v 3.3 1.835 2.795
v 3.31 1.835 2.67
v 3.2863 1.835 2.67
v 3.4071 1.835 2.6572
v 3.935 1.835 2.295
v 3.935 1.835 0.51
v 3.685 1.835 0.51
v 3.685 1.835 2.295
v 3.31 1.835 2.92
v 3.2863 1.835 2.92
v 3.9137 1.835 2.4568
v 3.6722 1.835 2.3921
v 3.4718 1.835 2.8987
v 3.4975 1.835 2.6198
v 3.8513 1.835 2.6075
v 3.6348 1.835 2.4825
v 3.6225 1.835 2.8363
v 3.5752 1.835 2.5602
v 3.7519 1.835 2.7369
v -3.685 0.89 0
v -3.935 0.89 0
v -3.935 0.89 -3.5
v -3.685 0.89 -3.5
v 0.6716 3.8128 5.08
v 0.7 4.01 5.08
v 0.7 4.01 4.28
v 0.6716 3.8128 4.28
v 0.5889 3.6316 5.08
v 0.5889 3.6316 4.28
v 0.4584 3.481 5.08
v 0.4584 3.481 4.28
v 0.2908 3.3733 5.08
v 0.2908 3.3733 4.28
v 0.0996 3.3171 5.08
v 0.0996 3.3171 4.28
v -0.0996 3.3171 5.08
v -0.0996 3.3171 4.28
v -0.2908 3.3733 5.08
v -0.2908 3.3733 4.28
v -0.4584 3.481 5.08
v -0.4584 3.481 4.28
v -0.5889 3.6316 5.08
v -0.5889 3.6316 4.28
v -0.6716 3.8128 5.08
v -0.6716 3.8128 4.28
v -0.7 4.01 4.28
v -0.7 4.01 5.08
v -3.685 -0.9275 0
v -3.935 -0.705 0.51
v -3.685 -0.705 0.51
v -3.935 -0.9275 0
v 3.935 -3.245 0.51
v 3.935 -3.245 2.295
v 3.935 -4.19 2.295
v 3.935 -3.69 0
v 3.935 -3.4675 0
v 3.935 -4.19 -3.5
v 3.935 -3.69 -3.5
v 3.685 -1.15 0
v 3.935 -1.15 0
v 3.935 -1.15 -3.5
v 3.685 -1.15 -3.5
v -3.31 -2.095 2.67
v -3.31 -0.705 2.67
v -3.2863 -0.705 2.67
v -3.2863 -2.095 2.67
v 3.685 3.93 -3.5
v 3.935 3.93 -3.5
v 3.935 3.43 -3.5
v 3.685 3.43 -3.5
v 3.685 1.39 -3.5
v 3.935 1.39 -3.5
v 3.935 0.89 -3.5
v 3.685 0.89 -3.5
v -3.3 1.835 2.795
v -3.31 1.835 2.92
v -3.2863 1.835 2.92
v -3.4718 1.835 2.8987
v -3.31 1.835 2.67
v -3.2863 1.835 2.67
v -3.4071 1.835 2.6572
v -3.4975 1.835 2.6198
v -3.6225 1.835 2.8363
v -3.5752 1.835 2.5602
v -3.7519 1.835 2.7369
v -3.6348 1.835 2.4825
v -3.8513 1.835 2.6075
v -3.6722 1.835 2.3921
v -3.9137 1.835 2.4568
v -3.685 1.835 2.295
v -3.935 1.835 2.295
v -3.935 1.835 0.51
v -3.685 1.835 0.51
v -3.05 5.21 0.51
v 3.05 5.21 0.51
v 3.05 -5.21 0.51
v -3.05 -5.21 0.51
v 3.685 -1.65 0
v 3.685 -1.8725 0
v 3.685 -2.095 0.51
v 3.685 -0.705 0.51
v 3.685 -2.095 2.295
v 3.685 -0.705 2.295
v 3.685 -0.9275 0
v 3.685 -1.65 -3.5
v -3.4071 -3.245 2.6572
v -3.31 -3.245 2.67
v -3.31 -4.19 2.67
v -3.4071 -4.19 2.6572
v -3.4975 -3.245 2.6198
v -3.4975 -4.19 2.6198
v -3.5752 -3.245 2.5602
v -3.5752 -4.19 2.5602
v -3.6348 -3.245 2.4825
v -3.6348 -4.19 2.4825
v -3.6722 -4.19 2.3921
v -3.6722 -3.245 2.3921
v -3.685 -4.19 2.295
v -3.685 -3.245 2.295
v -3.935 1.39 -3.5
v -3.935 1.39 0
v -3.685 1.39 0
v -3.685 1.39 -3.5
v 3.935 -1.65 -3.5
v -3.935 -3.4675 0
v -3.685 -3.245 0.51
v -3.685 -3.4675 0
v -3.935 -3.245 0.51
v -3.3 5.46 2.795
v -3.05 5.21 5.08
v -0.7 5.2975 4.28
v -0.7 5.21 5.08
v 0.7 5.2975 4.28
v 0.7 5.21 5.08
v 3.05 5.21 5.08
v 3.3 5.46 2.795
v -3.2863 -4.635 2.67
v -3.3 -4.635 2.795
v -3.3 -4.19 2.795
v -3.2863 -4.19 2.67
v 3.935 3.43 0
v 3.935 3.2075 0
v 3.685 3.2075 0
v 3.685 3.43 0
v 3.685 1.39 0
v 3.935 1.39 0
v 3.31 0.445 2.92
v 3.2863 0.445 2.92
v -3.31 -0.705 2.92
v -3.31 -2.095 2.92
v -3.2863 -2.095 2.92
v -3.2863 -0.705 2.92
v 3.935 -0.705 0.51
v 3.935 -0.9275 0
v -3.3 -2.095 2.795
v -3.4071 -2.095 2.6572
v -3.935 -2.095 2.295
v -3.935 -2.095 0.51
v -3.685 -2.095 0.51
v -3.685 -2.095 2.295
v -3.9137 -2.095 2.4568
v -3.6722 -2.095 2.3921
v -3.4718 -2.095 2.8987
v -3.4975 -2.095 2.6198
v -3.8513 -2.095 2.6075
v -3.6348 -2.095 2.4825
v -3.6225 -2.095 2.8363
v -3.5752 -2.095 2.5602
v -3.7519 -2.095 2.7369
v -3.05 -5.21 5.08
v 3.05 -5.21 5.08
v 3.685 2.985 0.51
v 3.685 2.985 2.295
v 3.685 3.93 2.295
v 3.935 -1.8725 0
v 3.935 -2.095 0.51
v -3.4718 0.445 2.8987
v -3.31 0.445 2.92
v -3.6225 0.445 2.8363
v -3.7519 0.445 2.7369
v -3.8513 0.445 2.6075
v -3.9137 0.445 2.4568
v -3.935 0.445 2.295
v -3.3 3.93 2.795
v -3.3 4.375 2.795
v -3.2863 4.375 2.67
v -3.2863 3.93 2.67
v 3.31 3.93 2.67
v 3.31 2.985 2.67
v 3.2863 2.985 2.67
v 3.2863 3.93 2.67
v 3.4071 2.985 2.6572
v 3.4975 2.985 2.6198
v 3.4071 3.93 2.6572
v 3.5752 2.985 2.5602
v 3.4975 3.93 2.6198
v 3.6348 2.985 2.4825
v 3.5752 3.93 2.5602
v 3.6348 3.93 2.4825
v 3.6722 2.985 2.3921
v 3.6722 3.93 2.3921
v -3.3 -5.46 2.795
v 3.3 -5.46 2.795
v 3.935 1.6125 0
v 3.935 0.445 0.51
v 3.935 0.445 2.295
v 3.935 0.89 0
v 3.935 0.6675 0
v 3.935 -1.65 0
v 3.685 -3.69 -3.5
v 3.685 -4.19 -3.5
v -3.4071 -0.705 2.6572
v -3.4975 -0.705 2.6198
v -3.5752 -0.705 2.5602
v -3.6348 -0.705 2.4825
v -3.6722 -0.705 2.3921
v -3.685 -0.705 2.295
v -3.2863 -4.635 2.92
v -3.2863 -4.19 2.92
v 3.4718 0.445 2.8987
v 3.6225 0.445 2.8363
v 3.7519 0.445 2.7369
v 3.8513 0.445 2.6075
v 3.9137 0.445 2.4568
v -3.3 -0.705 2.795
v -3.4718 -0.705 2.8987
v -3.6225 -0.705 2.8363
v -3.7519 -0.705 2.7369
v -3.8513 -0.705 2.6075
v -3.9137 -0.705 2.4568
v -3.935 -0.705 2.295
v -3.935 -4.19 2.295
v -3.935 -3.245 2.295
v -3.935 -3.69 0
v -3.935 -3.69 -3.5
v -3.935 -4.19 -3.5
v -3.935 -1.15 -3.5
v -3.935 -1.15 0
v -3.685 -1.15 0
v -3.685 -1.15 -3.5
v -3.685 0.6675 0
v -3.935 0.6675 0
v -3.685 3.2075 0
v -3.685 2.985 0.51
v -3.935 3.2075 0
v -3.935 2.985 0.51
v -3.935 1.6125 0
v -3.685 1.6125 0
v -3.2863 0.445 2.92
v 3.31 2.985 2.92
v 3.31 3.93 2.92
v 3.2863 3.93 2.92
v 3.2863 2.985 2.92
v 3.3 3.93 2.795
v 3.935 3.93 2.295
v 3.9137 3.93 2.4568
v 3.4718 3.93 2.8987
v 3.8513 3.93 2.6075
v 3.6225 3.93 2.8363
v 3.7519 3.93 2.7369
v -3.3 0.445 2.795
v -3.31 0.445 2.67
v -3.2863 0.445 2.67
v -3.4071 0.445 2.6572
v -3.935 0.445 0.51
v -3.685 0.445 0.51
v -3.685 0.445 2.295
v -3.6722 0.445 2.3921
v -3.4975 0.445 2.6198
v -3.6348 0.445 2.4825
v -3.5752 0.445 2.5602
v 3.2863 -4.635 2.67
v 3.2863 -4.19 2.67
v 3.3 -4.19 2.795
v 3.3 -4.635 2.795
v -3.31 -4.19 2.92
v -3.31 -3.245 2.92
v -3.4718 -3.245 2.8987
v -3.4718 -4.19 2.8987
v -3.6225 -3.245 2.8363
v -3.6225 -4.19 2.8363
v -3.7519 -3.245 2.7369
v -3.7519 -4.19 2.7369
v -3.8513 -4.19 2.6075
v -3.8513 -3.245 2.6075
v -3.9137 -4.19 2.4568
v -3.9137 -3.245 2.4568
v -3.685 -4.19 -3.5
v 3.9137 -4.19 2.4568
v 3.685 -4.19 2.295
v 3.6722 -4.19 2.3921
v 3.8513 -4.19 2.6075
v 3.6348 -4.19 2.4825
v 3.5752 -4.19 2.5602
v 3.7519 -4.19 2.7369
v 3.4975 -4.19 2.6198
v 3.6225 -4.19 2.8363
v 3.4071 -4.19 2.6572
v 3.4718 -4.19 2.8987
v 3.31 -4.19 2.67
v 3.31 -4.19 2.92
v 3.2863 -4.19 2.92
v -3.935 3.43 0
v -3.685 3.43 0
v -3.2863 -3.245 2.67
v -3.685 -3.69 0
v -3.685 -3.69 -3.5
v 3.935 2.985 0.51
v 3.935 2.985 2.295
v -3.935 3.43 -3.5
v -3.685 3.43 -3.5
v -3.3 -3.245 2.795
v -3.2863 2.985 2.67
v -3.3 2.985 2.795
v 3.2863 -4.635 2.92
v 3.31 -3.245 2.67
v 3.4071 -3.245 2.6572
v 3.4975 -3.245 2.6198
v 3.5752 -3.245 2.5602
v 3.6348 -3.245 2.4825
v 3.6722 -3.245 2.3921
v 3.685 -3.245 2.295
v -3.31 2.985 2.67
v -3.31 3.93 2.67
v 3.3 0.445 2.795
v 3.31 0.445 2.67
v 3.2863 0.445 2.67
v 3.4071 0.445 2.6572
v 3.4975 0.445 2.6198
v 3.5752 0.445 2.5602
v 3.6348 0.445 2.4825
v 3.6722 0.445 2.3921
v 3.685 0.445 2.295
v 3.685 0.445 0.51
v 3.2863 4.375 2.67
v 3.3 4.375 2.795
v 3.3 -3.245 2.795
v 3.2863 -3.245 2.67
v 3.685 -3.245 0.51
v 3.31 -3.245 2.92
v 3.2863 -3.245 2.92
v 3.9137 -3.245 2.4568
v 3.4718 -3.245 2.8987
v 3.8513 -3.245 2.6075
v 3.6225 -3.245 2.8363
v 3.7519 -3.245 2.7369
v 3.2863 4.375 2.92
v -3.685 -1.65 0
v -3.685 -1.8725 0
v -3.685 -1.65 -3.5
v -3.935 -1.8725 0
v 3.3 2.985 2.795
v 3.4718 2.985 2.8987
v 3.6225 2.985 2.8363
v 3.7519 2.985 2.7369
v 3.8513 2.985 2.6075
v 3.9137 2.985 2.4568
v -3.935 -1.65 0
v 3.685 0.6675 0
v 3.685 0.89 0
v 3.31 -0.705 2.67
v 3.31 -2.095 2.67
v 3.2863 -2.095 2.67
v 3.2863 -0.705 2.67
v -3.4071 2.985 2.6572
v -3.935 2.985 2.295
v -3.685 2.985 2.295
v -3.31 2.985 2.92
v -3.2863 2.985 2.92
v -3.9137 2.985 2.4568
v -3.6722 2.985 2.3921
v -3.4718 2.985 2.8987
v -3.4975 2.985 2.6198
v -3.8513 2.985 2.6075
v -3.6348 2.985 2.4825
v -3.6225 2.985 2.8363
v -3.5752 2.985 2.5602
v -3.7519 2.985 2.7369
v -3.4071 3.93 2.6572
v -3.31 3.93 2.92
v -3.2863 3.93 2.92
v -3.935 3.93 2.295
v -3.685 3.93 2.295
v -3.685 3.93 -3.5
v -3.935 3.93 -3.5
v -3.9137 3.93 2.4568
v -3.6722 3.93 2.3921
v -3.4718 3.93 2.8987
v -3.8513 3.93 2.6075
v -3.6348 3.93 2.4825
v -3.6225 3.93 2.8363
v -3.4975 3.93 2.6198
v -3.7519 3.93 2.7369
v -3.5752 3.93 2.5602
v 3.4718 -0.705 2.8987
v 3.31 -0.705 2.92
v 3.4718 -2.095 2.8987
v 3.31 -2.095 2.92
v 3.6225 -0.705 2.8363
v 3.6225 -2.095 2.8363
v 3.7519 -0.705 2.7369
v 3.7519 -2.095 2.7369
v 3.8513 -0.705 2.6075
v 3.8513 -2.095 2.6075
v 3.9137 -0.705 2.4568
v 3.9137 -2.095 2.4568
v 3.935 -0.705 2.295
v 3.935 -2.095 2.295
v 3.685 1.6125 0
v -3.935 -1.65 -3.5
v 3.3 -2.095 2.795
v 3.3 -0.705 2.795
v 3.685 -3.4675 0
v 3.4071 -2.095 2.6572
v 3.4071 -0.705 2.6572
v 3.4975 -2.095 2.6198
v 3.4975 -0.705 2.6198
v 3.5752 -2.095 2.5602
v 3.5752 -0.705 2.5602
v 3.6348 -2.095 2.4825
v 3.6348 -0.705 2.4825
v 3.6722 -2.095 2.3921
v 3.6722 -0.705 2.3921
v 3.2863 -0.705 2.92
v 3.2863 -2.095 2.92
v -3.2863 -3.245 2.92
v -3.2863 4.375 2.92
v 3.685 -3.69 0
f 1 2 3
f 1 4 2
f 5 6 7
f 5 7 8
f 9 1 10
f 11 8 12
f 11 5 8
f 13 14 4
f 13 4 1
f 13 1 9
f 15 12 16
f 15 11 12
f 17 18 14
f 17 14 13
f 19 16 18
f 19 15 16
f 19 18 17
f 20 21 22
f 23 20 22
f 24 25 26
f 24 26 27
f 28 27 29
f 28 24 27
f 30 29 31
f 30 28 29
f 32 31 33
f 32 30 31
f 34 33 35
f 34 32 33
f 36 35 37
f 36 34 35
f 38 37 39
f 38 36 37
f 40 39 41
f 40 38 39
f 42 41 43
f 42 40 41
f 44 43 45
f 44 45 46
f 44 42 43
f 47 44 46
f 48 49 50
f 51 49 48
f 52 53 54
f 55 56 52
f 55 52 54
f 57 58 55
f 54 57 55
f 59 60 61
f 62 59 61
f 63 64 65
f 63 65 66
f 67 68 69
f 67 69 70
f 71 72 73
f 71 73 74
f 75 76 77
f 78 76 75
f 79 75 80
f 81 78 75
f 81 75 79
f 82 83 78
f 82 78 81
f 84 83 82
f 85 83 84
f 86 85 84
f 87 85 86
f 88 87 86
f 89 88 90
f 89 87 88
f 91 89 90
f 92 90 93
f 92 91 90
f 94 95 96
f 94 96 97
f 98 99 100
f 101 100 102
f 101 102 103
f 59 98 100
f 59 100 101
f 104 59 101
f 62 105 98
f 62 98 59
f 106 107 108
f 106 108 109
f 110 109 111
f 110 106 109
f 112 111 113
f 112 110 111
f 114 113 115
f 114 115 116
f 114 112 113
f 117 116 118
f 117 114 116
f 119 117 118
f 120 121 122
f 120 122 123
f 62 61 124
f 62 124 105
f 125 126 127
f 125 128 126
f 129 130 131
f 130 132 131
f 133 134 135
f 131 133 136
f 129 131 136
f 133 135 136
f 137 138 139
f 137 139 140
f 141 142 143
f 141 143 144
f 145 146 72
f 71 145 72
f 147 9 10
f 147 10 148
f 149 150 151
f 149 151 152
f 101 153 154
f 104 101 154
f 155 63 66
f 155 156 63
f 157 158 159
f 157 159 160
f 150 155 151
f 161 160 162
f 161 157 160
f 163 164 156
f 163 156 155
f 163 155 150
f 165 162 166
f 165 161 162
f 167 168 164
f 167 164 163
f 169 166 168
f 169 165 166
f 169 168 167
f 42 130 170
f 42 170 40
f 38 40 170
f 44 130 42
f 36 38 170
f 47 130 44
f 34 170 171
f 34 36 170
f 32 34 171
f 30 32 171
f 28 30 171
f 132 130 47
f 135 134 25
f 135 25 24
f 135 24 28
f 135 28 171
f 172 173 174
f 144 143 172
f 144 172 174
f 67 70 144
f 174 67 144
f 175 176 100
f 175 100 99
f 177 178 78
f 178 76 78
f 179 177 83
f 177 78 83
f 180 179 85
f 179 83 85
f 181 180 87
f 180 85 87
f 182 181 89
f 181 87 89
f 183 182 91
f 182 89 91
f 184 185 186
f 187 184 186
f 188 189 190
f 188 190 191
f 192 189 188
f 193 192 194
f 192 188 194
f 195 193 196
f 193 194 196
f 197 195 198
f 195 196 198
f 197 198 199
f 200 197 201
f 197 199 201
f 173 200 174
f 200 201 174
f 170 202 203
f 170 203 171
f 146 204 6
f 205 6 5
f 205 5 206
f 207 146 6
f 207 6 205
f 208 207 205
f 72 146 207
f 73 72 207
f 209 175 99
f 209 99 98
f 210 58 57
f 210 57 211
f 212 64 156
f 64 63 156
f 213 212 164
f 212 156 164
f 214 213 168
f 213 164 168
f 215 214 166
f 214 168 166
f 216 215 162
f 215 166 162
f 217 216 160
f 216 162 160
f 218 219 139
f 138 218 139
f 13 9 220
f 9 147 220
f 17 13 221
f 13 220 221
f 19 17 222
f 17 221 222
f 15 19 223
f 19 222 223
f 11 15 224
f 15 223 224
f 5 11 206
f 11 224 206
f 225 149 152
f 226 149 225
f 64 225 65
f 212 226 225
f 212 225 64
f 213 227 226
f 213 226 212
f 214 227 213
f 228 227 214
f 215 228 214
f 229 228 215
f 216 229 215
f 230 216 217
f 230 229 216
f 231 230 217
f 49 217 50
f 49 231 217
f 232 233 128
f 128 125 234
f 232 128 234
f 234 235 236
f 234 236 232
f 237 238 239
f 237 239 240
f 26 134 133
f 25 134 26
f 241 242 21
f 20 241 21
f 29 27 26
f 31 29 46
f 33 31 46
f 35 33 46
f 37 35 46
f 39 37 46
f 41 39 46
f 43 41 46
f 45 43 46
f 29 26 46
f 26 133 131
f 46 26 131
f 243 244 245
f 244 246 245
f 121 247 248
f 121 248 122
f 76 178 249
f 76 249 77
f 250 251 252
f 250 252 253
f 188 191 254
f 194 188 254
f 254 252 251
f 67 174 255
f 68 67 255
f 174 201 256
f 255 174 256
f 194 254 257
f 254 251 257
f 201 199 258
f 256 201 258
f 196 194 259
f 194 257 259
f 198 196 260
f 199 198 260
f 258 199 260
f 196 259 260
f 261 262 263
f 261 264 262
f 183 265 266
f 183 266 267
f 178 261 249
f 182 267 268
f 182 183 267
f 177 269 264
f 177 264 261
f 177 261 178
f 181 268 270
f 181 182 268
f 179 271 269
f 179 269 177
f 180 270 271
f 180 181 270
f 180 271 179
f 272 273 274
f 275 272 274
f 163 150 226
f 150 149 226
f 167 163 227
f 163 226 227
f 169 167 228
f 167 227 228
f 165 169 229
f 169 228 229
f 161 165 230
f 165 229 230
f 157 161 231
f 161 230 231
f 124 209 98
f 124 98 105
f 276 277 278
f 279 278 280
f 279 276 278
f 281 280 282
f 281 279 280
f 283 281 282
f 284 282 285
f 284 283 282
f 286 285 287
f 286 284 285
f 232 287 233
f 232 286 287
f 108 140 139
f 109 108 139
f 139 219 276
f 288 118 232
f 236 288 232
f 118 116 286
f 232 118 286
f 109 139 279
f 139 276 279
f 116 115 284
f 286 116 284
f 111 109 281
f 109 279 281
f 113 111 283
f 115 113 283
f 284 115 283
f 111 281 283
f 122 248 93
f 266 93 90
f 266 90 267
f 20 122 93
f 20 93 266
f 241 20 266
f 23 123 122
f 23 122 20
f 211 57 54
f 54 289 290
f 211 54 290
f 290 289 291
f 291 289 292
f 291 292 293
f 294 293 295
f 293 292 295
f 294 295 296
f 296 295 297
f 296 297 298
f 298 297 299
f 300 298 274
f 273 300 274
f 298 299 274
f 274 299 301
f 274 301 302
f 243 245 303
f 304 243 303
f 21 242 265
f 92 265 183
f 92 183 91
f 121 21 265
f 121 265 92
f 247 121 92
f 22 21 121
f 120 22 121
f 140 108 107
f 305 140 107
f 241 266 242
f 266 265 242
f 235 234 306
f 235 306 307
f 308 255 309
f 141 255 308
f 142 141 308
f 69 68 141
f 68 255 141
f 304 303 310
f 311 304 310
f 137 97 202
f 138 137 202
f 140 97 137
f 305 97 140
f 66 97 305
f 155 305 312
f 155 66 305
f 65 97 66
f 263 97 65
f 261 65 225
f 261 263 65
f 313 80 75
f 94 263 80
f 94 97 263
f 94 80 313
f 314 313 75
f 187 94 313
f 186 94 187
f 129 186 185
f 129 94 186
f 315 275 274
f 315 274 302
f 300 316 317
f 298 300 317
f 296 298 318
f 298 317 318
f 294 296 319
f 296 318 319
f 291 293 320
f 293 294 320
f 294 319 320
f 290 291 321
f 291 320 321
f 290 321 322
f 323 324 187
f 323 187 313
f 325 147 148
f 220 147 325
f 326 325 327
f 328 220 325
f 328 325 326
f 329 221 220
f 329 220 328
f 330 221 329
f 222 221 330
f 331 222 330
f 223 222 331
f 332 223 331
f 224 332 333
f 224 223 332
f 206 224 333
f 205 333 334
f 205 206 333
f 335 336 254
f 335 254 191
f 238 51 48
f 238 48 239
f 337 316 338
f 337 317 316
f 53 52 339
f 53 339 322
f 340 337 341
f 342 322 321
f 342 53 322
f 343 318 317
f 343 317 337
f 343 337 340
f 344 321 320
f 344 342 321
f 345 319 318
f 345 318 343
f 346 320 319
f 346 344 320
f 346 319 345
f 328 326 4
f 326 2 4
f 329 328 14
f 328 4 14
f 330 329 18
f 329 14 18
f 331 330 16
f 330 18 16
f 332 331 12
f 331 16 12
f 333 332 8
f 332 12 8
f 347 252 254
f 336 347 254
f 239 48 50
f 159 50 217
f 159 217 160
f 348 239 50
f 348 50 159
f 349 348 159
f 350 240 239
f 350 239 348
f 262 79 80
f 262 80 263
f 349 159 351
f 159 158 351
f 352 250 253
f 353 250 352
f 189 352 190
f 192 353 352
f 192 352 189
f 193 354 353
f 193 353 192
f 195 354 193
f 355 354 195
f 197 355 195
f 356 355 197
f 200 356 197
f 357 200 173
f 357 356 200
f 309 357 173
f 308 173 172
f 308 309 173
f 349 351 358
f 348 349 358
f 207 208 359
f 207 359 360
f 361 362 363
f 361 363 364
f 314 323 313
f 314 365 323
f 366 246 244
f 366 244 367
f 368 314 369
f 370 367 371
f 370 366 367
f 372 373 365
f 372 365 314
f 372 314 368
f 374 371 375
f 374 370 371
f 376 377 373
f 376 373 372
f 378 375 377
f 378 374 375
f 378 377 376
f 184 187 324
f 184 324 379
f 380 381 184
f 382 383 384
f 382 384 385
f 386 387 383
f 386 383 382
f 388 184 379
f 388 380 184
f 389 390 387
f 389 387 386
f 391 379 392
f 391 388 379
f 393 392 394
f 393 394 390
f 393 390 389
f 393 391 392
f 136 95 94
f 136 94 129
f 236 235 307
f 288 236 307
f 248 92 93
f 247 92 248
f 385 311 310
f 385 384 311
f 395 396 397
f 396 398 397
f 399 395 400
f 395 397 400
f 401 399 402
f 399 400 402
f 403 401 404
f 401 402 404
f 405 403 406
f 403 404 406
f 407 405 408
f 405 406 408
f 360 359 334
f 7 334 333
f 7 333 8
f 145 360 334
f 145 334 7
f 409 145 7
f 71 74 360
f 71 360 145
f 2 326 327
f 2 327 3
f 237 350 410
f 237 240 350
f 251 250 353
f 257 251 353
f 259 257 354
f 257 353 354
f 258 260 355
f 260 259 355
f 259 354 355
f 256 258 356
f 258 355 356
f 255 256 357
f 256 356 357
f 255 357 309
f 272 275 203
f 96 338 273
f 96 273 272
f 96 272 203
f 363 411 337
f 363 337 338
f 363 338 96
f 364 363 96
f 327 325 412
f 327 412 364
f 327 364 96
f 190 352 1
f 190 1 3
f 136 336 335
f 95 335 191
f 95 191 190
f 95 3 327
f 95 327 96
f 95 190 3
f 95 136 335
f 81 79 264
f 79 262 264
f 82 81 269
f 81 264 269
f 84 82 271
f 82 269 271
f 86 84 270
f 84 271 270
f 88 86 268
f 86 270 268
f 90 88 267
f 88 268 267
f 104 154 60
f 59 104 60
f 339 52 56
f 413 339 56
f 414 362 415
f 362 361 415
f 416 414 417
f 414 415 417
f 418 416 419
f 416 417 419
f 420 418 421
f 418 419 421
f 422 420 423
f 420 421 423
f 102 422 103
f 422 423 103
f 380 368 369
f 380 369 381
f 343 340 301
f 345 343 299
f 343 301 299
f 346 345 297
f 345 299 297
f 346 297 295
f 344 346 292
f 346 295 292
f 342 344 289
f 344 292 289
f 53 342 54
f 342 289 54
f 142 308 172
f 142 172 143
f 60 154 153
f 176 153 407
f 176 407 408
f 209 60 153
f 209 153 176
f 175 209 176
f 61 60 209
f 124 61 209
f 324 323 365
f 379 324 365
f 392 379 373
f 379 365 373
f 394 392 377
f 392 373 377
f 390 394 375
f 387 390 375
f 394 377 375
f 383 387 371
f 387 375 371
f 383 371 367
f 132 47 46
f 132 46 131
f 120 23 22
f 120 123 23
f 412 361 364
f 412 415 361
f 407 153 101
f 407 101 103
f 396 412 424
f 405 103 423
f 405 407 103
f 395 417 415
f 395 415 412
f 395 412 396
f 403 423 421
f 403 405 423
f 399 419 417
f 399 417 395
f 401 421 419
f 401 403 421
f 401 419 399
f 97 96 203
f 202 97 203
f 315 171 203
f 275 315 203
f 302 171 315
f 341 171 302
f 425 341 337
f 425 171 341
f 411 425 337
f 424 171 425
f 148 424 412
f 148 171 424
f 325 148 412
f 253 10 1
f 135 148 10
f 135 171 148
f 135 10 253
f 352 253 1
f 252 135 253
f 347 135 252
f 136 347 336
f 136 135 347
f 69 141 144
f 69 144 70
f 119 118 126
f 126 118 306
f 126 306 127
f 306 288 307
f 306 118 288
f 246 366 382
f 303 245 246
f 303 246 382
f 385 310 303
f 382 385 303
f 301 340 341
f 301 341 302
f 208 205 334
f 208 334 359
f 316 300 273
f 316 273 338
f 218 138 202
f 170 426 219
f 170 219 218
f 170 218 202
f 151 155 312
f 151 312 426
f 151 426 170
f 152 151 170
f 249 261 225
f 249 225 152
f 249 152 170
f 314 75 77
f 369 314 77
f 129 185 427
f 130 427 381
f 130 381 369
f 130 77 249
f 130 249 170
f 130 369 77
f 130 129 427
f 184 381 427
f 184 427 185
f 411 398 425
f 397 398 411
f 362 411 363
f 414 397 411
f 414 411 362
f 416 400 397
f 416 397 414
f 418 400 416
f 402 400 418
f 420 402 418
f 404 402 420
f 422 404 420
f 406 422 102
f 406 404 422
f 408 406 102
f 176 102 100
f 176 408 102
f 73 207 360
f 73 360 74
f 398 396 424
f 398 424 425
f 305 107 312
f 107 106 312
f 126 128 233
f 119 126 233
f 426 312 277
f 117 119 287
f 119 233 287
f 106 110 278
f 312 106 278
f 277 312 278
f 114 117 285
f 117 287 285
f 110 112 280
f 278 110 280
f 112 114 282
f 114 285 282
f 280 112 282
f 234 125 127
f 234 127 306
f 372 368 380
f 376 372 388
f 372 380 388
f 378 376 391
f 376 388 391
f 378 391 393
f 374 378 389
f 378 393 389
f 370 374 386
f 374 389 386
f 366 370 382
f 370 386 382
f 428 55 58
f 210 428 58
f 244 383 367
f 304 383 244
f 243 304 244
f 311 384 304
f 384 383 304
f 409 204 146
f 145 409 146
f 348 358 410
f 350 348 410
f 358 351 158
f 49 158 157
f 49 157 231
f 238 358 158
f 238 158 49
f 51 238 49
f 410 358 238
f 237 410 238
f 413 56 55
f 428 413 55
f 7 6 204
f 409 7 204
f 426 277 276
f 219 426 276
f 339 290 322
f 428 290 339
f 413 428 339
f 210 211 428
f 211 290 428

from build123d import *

# Parameters (mm, degrees)
BASIC_SHAPE_DEPTH              = 5.46
SIDE_PROFILE1_DEPTH            = 4.3
SIDE_PROFILE1_DEPTH_BACK       = 4.3
SIDE_PROFILE2_DEPTH            = 4.3
SIDE_PROFILE2_DEPTH_BACK       = 4.3
LOCATION_MARK_DEPTH            = 0.8
SKETCH6_W                      = 0.25
SKETCH6_H                      = 1.39
PIN_RELIEF_DEPTH               = 8.235
REMAINING_PINS_COUNT           = 4
REMAINING_PINS_PITCH           = 2.54
REMAINING_PINS_COPY_1_SKETCH_W = 0.25
REMAINING_PINS_COPY_1_SKETCH_H = 1.39
REMAINING_PINS_COPY_2_SKETCH_W = 0.25
REMAINING_PINS_COPY_2_SKETCH_H = 1.39
REMAINING_PINS_COPY_3_SKETCH_W = 0.25
REMAINING_PINS_COPY_3_SKETCH_H = 1.39
REMAINING_PINS_COPY_4_DEPTH    = 8.235
REMAINING_PINS_COPY_5_DEPTH    = 8.235
REMAINING_PINS_COPY_6_DEPTH    = 8.235
PIN_SHAPE1_DEPTH               = 0.445
PIN_SHAPE2_DEPTH               = 0.445


with BuildPart() as part:
    # Sketch1 → Basic Shape (new body, symmetric)
    with BuildSketch(Plane(origin=(0, 0, 0), x_dir=(1, 0, 0), z_dir=(0, 1, 0))):
        Polygon((-3.05, -0.51), (-3.3, -2.795), (-3.05, -5.08), (3.05, -5.08), (3.3, -2.795), (3.05, -0.51), align=None)
    extrude(amount=BASIC_SHAPE_DEPTH, both=True)

    # Sketch2 → Side Profile1 (cut, two sides)
    with BuildSketch(Plane(origin=(0, 0, 0), x_dir=(0, 0, -1), z_dir=(1, 0, 0))) as side_profile1_sk:
        Polygon((-5.08, 5.46), (-5.08, 5.21), (-2.795, 5.46), align=None)
        Polygon((-5.08, -5.46), (-2.795, -5.46), (-5.08, -5.21), align=None)
    extrude(amount=SIDE_PROFILE1_DEPTH, mode=Mode.SUBTRACT)
    extrude(side_profile1_sk.sketch, amount=-SIDE_PROFILE1_DEPTH_BACK, mode=Mode.SUBTRACT)

    # Sketch3 → Side Profile2 (cut, two sides)
    with BuildSketch(Plane(origin=(0, 0, 0), x_dir=(0, 0, -1), z_dir=(1, 0, 0))) as side_profile2_sk:
        Polygon((-2.795, 5.46), (-0.51, 5.46), (-0.51, 5.21), align=None)
        Polygon((-2.795, -5.46), (-0.51, -5.46), (-0.51, -5.21), align=None)
    extrude(amount=SIDE_PROFILE2_DEPTH, mode=Mode.SUBTRACT)
    extrude(side_profile2_sk.sketch, amount=-SIDE_PROFILE2_DEPTH_BACK, mode=Mode.SUBTRACT)

    # Sketch4 → Location Mark (cut)
    with BuildSketch(Plane(origin=(0, 0, 5.08), x_dir=(-1, 0, 0), z_dir=(0, 0, -1))):
        with BuildLine():
            Line((0.7, 6.21), (-0.7, 6.21))
            Line((-0.7, 6.21), (-0.7, 5.21))
            Line((-0.7, 5.21), (-0.7, 4.01))
            ThreePointArc((-0.7, 4.01), (0, 3.31), (0.7, 4.01))
            Line((0.7, 4.01), (0.7, 5.21))
            Line((0.7, 5.21), (0.7, 6.21))
        make_face()
    extrude(amount=LOCATION_MARK_DEPTH, mode=Mode.SUBTRACT)

    # First Pin: sweep along a path in Sketch5
    with BuildLine(Plane(origin=(0, -3.94, 0), x_dir=(1, 0, 0), z_dir=(0, 1, 0))) as first_pin_path:
        Line((0, -2.795), (3.31, -2.795))
        ThreePointArc((3.31, -2.795), (3.663553391, -2.648553391), (3.81, -2.295))
        Line((3.81, -2.295), (3.81, 3.5))
    # Sketch6 → First Pin (sweep)
    with BuildSketch(Plane(origin=(0, 0, 0), x_dir=(0, 0, -1), z_dir=(1, 0, 0))):
        with Locations((-2.795, -3.94)):
            Rectangle(SKETCH6_W, SKETCH6_H)
    first_pin = sweep(path=first_pin_path.line)

    # Sketch7 → Pin Relief (cut, through all)
    with BuildSketch(Plane(origin=(3.935, 0, 0), x_dir=(0, 0, -1), z_dir=(1, 0, 0))):
        Polygon((0, -4.19), (3.5, -4.19), (3.5, -4.635), (-0.51, -4.635), (0, -4.4125), align=None)
        Polygon((0, -3.69), (3.5, -3.69), (3.5, -3.245), (-0.51, -3.245), (0, -3.4675), align=None)
    pin_relief = extrude(amount=-PIN_RELIEF_DEPTH, mode=Mode.SUBTRACT)

    # Opp Pin: First Pin, Pin Relief across plane
    add(first_pin.mirror(Plane(origin=(0, 0, 0), x_dir=(0, 0, 1), z_dir=(1, 0, 0))))
    add(pin_relief.mirror(Plane(origin=(0, 0, 0), x_dir=(0, 0, 1), z_dir=(1, 0, 0))), mode=Mode.SUBTRACT)

    # Remaining Pins: First Pin, Pin Relief ×4
    with Locations(*[(0, i * REMAINING_PINS_PITCH, 0) for i in range(1, REMAINING_PINS_COUNT)]):
        add(first_pin)
        add(pin_relief, mode=Mode.SUBTRACT)

    # Remaining Pins copy 1: sweep along a path in Remaining Pins copy 1 path
    with BuildLine(Plane(origin=(0, -1.4, 0), x_dir=(-1, 0, 0), z_dir=(0, 1, 0))) as remaining_pins_copy_1_path:
        Line((0, 2.795), (3.31, 2.795))
        ThreePointArc((3.31, 2.795), (3.663553391, 2.648553391), (3.81, 2.295))
        Line((3.81, 2.295), (3.81, -3.5))
    # Remaining Pins copy 1 sketch → Remaining Pins copy 1 (sweep)
    with BuildSketch(Plane(origin=(0, 2.54, 0), x_dir=(0, 0, -1), z_dir=(-1, 0, 0))):
        with Locations((-2.795, 3.94)):
            Rectangle(REMAINING_PINS_COPY_1_SKETCH_W, REMAINING_PINS_COPY_1_SKETCH_H)
    sweep(path=remaining_pins_copy_1_path.line)

    # Remaining Pins copy 2: sweep along a path in Remaining Pins copy 2 path
    with BuildLine(Plane(origin=(0, 1.14, 0), x_dir=(-1, 0, 0), z_dir=(0, 1, 0))) as remaining_pins_copy_2_path:
        Line((0, 2.795), (3.31, 2.795))
        ThreePointArc((3.31, 2.795), (3.663553391, 2.648553391), (3.81, 2.295))
        Line((3.81, 2.295), (3.81, -3.5))
    # Remaining Pins copy 2 sketch → Remaining Pins copy 2 (sweep)
    with BuildSketch(Plane(origin=(0, 5.08, 0), x_dir=(0, 0, -1), z_dir=(-1, 0, 0))):
        with Locations((-2.795, 3.94)):
            Rectangle(REMAINING_PINS_COPY_2_SKETCH_W, REMAINING_PINS_COPY_2_SKETCH_H)
    sweep(path=remaining_pins_copy_2_path.line)

    # Remaining Pins copy 3: sweep along a path in Remaining Pins copy 3 path
    with BuildLine(Plane(origin=(0, 3.68, 0), x_dir=(-1, 0, 0), z_dir=(0, 1, 0))) as remaining_pins_copy_3_path:
        Line((0, 2.795), (3.31, 2.795))
        ThreePointArc((3.31, 2.795), (3.663553391, 2.648553391), (3.81, 2.295))
        Line((3.81, 2.295), (3.81, -3.5))
    # Remaining Pins copy 3 sketch → Remaining Pins copy 3 (sweep)
    with BuildSketch(Plane(origin=(0, 7.62, 0), x_dir=(0, 0, -1), z_dir=(-1, 0, 0))):
        with Locations((-2.795, 3.94)):
            Rectangle(REMAINING_PINS_COPY_3_SKETCH_W, REMAINING_PINS_COPY_3_SKETCH_H)
    sweep(path=remaining_pins_copy_3_path.line)

    # Remaining Pins copy 4 sketch → Remaining Pins copy 4 (cut, through all)
    with BuildSketch(Plane(origin=(-3.935, 2.54, 0), x_dir=(0, 0, -1), z_dir=(-1, 0, 0))):
        Polygon((0, 4.19), (3.5, 4.19), (3.5, 4.635), (-0.51, 4.635), (0, 4.4125), align=None)
        Polygon((0, 3.69), (3.5, 3.69), (3.5, 3.245), (-0.51, 3.245), (0, 3.4675), align=None)
    extrude(amount=-REMAINING_PINS_COPY_4_DEPTH, mode=Mode.SUBTRACT)

    # Remaining Pins copy 5 sketch → Remaining Pins copy 5 (cut, through all)
    with BuildSketch(Plane(origin=(-3.935, 5.08, 0), x_dir=(0, 0, -1), z_dir=(-1, 0, 0))):
        Polygon((0, 4.19), (3.5, 4.19), (3.5, 4.635), (-0.51, 4.635), (0, 4.4125), align=None)
        Polygon((0, 3.69), (3.5, 3.69), (3.5, 3.245), (-0.51, 3.245), (0, 3.4675), align=None)
    extrude(amount=-REMAINING_PINS_COPY_5_DEPTH, mode=Mode.SUBTRACT)

    # Remaining Pins copy 6 sketch → Remaining Pins copy 6 (cut, through all)
    with BuildSketch(Plane(origin=(-3.935, 7.62, 0), x_dir=(0, 0, -1), z_dir=(-1, 0, 0))):
        Polygon((0, 4.19), (3.5, 4.19), (3.5, 4.635), (-0.51, 4.635), (0, 4.4125), align=None)
        Polygon((0, 3.69), (3.5, 3.69), (3.5, 3.245), (-0.51, 3.245), (0, 3.4675), align=None)
    extrude(amount=-REMAINING_PINS_COPY_6_DEPTH, mode=Mode.SUBTRACT)

    # Sketch9 → Pin Shape1 (cut)
    with BuildSketch(Plane.XZ.offset(4.635)):
        with BuildLine():
            Line((3.935, 0), (3.685, 0))
            Line((3.685, 0), (3.685, 2.295))
            ThreePointArc((3.685, 2.295), (3.575165043, 2.560165043), (3.31, 2.67))
            Line((3.31, 2.67), (3.286323851, 2.67))
            Line((3.286323851, 2.67), (3.3, 2.795))
            Line((3.3, 2.795), (3.286323851, 2.92))
            Line((3.286323851, 2.92), (3.31, 2.92))
            ThreePointArc((3.31, 2.92), (3.751941738, 2.736941738), (3.935, 2.295))
            Line((3.935, 2.295), (3.935, 0))
        make_face()
        with BuildLine():
            Line((-3.685, 0), (-3.935, 0))
            Line((-3.935, 0), (-3.935, 2.295))
            ThreePointArc((-3.935, 2.295), (-3.751941738, 2.736941738), (-3.31, 2.92))
            Line((-3.31, 2.92), (-3.286323851, 2.92))
            Line((-3.286323851, 2.92), (-3.3, 2.795))
            Line((-3.3, 2.795), (-3.286323851, 2.67))
            Line((-3.286323851, 2.67), (-3.31, 2.67))
            ThreePointArc((-3.31, 2.67), (-3.575165043, 2.560165043), (-3.685, 2.295))
            Line((-3.685, 2.295), (-3.685, 0))
        make_face()
    extrude(amount=-PIN_SHAPE1_DEPTH, mode=Mode.SUBTRACT)

    # Sketch10 → Pin Shape2 (cut)
    with BuildSketch(Plane(origin=(0, 4.375, 0), x_dir=(-1, 0, 0), z_dir=(0, 1, 0))):
        with BuildLine():
            Line((3.685, 0), (3.935, 0))
            Line((3.935, 0), (3.935, 2.295))
            ThreePointArc((3.935, 2.295), (3.751941738, 2.736941738), (3.31, 2.92))
            Line((3.31, 2.92), (3.286323851, 2.92))
            Line((3.286323851, 2.92), (3.3, 2.795))
            Line((3.3, 2.795), (3.286323851, 2.67))
            Line((3.286323851, 2.67), (3.31, 2.67))
            ThreePointArc((3.31, 2.67), (3.575165043, 2.560165043), (3.685, 2.295))
            Line((3.685, 2.295), (3.685, 0))
        make_face()
        with BuildLine():
            Line((-3.685, 0), (-3.935, 0))
            Line((-3.935, 0), (-3.935, 2.295))
            ThreePointArc((-3.935, 2.295), (-3.751941738, 2.736941738), (-3.31, 2.92))
            Line((-3.31, 2.92), (-3.286323851, 2.92))
            Line((-3.286323851, 2.92), (-3.3, 2.795))
            Line((-3.3, 2.795), (-3.286323851, 2.67))
            Line((-3.286323851, 2.67), (-3.31, 2.67))
            ThreePointArc((-3.31, 2.67), (-3.575165043, 2.560165043), (-3.685, 2.295))
            Line((-3.685, 2.295), (-3.685, 0))
        make_face()
    extrude(amount=-PIN_SHAPE2_DEPTH, mode=Mode.SUBTRACT)


solid = part.part
